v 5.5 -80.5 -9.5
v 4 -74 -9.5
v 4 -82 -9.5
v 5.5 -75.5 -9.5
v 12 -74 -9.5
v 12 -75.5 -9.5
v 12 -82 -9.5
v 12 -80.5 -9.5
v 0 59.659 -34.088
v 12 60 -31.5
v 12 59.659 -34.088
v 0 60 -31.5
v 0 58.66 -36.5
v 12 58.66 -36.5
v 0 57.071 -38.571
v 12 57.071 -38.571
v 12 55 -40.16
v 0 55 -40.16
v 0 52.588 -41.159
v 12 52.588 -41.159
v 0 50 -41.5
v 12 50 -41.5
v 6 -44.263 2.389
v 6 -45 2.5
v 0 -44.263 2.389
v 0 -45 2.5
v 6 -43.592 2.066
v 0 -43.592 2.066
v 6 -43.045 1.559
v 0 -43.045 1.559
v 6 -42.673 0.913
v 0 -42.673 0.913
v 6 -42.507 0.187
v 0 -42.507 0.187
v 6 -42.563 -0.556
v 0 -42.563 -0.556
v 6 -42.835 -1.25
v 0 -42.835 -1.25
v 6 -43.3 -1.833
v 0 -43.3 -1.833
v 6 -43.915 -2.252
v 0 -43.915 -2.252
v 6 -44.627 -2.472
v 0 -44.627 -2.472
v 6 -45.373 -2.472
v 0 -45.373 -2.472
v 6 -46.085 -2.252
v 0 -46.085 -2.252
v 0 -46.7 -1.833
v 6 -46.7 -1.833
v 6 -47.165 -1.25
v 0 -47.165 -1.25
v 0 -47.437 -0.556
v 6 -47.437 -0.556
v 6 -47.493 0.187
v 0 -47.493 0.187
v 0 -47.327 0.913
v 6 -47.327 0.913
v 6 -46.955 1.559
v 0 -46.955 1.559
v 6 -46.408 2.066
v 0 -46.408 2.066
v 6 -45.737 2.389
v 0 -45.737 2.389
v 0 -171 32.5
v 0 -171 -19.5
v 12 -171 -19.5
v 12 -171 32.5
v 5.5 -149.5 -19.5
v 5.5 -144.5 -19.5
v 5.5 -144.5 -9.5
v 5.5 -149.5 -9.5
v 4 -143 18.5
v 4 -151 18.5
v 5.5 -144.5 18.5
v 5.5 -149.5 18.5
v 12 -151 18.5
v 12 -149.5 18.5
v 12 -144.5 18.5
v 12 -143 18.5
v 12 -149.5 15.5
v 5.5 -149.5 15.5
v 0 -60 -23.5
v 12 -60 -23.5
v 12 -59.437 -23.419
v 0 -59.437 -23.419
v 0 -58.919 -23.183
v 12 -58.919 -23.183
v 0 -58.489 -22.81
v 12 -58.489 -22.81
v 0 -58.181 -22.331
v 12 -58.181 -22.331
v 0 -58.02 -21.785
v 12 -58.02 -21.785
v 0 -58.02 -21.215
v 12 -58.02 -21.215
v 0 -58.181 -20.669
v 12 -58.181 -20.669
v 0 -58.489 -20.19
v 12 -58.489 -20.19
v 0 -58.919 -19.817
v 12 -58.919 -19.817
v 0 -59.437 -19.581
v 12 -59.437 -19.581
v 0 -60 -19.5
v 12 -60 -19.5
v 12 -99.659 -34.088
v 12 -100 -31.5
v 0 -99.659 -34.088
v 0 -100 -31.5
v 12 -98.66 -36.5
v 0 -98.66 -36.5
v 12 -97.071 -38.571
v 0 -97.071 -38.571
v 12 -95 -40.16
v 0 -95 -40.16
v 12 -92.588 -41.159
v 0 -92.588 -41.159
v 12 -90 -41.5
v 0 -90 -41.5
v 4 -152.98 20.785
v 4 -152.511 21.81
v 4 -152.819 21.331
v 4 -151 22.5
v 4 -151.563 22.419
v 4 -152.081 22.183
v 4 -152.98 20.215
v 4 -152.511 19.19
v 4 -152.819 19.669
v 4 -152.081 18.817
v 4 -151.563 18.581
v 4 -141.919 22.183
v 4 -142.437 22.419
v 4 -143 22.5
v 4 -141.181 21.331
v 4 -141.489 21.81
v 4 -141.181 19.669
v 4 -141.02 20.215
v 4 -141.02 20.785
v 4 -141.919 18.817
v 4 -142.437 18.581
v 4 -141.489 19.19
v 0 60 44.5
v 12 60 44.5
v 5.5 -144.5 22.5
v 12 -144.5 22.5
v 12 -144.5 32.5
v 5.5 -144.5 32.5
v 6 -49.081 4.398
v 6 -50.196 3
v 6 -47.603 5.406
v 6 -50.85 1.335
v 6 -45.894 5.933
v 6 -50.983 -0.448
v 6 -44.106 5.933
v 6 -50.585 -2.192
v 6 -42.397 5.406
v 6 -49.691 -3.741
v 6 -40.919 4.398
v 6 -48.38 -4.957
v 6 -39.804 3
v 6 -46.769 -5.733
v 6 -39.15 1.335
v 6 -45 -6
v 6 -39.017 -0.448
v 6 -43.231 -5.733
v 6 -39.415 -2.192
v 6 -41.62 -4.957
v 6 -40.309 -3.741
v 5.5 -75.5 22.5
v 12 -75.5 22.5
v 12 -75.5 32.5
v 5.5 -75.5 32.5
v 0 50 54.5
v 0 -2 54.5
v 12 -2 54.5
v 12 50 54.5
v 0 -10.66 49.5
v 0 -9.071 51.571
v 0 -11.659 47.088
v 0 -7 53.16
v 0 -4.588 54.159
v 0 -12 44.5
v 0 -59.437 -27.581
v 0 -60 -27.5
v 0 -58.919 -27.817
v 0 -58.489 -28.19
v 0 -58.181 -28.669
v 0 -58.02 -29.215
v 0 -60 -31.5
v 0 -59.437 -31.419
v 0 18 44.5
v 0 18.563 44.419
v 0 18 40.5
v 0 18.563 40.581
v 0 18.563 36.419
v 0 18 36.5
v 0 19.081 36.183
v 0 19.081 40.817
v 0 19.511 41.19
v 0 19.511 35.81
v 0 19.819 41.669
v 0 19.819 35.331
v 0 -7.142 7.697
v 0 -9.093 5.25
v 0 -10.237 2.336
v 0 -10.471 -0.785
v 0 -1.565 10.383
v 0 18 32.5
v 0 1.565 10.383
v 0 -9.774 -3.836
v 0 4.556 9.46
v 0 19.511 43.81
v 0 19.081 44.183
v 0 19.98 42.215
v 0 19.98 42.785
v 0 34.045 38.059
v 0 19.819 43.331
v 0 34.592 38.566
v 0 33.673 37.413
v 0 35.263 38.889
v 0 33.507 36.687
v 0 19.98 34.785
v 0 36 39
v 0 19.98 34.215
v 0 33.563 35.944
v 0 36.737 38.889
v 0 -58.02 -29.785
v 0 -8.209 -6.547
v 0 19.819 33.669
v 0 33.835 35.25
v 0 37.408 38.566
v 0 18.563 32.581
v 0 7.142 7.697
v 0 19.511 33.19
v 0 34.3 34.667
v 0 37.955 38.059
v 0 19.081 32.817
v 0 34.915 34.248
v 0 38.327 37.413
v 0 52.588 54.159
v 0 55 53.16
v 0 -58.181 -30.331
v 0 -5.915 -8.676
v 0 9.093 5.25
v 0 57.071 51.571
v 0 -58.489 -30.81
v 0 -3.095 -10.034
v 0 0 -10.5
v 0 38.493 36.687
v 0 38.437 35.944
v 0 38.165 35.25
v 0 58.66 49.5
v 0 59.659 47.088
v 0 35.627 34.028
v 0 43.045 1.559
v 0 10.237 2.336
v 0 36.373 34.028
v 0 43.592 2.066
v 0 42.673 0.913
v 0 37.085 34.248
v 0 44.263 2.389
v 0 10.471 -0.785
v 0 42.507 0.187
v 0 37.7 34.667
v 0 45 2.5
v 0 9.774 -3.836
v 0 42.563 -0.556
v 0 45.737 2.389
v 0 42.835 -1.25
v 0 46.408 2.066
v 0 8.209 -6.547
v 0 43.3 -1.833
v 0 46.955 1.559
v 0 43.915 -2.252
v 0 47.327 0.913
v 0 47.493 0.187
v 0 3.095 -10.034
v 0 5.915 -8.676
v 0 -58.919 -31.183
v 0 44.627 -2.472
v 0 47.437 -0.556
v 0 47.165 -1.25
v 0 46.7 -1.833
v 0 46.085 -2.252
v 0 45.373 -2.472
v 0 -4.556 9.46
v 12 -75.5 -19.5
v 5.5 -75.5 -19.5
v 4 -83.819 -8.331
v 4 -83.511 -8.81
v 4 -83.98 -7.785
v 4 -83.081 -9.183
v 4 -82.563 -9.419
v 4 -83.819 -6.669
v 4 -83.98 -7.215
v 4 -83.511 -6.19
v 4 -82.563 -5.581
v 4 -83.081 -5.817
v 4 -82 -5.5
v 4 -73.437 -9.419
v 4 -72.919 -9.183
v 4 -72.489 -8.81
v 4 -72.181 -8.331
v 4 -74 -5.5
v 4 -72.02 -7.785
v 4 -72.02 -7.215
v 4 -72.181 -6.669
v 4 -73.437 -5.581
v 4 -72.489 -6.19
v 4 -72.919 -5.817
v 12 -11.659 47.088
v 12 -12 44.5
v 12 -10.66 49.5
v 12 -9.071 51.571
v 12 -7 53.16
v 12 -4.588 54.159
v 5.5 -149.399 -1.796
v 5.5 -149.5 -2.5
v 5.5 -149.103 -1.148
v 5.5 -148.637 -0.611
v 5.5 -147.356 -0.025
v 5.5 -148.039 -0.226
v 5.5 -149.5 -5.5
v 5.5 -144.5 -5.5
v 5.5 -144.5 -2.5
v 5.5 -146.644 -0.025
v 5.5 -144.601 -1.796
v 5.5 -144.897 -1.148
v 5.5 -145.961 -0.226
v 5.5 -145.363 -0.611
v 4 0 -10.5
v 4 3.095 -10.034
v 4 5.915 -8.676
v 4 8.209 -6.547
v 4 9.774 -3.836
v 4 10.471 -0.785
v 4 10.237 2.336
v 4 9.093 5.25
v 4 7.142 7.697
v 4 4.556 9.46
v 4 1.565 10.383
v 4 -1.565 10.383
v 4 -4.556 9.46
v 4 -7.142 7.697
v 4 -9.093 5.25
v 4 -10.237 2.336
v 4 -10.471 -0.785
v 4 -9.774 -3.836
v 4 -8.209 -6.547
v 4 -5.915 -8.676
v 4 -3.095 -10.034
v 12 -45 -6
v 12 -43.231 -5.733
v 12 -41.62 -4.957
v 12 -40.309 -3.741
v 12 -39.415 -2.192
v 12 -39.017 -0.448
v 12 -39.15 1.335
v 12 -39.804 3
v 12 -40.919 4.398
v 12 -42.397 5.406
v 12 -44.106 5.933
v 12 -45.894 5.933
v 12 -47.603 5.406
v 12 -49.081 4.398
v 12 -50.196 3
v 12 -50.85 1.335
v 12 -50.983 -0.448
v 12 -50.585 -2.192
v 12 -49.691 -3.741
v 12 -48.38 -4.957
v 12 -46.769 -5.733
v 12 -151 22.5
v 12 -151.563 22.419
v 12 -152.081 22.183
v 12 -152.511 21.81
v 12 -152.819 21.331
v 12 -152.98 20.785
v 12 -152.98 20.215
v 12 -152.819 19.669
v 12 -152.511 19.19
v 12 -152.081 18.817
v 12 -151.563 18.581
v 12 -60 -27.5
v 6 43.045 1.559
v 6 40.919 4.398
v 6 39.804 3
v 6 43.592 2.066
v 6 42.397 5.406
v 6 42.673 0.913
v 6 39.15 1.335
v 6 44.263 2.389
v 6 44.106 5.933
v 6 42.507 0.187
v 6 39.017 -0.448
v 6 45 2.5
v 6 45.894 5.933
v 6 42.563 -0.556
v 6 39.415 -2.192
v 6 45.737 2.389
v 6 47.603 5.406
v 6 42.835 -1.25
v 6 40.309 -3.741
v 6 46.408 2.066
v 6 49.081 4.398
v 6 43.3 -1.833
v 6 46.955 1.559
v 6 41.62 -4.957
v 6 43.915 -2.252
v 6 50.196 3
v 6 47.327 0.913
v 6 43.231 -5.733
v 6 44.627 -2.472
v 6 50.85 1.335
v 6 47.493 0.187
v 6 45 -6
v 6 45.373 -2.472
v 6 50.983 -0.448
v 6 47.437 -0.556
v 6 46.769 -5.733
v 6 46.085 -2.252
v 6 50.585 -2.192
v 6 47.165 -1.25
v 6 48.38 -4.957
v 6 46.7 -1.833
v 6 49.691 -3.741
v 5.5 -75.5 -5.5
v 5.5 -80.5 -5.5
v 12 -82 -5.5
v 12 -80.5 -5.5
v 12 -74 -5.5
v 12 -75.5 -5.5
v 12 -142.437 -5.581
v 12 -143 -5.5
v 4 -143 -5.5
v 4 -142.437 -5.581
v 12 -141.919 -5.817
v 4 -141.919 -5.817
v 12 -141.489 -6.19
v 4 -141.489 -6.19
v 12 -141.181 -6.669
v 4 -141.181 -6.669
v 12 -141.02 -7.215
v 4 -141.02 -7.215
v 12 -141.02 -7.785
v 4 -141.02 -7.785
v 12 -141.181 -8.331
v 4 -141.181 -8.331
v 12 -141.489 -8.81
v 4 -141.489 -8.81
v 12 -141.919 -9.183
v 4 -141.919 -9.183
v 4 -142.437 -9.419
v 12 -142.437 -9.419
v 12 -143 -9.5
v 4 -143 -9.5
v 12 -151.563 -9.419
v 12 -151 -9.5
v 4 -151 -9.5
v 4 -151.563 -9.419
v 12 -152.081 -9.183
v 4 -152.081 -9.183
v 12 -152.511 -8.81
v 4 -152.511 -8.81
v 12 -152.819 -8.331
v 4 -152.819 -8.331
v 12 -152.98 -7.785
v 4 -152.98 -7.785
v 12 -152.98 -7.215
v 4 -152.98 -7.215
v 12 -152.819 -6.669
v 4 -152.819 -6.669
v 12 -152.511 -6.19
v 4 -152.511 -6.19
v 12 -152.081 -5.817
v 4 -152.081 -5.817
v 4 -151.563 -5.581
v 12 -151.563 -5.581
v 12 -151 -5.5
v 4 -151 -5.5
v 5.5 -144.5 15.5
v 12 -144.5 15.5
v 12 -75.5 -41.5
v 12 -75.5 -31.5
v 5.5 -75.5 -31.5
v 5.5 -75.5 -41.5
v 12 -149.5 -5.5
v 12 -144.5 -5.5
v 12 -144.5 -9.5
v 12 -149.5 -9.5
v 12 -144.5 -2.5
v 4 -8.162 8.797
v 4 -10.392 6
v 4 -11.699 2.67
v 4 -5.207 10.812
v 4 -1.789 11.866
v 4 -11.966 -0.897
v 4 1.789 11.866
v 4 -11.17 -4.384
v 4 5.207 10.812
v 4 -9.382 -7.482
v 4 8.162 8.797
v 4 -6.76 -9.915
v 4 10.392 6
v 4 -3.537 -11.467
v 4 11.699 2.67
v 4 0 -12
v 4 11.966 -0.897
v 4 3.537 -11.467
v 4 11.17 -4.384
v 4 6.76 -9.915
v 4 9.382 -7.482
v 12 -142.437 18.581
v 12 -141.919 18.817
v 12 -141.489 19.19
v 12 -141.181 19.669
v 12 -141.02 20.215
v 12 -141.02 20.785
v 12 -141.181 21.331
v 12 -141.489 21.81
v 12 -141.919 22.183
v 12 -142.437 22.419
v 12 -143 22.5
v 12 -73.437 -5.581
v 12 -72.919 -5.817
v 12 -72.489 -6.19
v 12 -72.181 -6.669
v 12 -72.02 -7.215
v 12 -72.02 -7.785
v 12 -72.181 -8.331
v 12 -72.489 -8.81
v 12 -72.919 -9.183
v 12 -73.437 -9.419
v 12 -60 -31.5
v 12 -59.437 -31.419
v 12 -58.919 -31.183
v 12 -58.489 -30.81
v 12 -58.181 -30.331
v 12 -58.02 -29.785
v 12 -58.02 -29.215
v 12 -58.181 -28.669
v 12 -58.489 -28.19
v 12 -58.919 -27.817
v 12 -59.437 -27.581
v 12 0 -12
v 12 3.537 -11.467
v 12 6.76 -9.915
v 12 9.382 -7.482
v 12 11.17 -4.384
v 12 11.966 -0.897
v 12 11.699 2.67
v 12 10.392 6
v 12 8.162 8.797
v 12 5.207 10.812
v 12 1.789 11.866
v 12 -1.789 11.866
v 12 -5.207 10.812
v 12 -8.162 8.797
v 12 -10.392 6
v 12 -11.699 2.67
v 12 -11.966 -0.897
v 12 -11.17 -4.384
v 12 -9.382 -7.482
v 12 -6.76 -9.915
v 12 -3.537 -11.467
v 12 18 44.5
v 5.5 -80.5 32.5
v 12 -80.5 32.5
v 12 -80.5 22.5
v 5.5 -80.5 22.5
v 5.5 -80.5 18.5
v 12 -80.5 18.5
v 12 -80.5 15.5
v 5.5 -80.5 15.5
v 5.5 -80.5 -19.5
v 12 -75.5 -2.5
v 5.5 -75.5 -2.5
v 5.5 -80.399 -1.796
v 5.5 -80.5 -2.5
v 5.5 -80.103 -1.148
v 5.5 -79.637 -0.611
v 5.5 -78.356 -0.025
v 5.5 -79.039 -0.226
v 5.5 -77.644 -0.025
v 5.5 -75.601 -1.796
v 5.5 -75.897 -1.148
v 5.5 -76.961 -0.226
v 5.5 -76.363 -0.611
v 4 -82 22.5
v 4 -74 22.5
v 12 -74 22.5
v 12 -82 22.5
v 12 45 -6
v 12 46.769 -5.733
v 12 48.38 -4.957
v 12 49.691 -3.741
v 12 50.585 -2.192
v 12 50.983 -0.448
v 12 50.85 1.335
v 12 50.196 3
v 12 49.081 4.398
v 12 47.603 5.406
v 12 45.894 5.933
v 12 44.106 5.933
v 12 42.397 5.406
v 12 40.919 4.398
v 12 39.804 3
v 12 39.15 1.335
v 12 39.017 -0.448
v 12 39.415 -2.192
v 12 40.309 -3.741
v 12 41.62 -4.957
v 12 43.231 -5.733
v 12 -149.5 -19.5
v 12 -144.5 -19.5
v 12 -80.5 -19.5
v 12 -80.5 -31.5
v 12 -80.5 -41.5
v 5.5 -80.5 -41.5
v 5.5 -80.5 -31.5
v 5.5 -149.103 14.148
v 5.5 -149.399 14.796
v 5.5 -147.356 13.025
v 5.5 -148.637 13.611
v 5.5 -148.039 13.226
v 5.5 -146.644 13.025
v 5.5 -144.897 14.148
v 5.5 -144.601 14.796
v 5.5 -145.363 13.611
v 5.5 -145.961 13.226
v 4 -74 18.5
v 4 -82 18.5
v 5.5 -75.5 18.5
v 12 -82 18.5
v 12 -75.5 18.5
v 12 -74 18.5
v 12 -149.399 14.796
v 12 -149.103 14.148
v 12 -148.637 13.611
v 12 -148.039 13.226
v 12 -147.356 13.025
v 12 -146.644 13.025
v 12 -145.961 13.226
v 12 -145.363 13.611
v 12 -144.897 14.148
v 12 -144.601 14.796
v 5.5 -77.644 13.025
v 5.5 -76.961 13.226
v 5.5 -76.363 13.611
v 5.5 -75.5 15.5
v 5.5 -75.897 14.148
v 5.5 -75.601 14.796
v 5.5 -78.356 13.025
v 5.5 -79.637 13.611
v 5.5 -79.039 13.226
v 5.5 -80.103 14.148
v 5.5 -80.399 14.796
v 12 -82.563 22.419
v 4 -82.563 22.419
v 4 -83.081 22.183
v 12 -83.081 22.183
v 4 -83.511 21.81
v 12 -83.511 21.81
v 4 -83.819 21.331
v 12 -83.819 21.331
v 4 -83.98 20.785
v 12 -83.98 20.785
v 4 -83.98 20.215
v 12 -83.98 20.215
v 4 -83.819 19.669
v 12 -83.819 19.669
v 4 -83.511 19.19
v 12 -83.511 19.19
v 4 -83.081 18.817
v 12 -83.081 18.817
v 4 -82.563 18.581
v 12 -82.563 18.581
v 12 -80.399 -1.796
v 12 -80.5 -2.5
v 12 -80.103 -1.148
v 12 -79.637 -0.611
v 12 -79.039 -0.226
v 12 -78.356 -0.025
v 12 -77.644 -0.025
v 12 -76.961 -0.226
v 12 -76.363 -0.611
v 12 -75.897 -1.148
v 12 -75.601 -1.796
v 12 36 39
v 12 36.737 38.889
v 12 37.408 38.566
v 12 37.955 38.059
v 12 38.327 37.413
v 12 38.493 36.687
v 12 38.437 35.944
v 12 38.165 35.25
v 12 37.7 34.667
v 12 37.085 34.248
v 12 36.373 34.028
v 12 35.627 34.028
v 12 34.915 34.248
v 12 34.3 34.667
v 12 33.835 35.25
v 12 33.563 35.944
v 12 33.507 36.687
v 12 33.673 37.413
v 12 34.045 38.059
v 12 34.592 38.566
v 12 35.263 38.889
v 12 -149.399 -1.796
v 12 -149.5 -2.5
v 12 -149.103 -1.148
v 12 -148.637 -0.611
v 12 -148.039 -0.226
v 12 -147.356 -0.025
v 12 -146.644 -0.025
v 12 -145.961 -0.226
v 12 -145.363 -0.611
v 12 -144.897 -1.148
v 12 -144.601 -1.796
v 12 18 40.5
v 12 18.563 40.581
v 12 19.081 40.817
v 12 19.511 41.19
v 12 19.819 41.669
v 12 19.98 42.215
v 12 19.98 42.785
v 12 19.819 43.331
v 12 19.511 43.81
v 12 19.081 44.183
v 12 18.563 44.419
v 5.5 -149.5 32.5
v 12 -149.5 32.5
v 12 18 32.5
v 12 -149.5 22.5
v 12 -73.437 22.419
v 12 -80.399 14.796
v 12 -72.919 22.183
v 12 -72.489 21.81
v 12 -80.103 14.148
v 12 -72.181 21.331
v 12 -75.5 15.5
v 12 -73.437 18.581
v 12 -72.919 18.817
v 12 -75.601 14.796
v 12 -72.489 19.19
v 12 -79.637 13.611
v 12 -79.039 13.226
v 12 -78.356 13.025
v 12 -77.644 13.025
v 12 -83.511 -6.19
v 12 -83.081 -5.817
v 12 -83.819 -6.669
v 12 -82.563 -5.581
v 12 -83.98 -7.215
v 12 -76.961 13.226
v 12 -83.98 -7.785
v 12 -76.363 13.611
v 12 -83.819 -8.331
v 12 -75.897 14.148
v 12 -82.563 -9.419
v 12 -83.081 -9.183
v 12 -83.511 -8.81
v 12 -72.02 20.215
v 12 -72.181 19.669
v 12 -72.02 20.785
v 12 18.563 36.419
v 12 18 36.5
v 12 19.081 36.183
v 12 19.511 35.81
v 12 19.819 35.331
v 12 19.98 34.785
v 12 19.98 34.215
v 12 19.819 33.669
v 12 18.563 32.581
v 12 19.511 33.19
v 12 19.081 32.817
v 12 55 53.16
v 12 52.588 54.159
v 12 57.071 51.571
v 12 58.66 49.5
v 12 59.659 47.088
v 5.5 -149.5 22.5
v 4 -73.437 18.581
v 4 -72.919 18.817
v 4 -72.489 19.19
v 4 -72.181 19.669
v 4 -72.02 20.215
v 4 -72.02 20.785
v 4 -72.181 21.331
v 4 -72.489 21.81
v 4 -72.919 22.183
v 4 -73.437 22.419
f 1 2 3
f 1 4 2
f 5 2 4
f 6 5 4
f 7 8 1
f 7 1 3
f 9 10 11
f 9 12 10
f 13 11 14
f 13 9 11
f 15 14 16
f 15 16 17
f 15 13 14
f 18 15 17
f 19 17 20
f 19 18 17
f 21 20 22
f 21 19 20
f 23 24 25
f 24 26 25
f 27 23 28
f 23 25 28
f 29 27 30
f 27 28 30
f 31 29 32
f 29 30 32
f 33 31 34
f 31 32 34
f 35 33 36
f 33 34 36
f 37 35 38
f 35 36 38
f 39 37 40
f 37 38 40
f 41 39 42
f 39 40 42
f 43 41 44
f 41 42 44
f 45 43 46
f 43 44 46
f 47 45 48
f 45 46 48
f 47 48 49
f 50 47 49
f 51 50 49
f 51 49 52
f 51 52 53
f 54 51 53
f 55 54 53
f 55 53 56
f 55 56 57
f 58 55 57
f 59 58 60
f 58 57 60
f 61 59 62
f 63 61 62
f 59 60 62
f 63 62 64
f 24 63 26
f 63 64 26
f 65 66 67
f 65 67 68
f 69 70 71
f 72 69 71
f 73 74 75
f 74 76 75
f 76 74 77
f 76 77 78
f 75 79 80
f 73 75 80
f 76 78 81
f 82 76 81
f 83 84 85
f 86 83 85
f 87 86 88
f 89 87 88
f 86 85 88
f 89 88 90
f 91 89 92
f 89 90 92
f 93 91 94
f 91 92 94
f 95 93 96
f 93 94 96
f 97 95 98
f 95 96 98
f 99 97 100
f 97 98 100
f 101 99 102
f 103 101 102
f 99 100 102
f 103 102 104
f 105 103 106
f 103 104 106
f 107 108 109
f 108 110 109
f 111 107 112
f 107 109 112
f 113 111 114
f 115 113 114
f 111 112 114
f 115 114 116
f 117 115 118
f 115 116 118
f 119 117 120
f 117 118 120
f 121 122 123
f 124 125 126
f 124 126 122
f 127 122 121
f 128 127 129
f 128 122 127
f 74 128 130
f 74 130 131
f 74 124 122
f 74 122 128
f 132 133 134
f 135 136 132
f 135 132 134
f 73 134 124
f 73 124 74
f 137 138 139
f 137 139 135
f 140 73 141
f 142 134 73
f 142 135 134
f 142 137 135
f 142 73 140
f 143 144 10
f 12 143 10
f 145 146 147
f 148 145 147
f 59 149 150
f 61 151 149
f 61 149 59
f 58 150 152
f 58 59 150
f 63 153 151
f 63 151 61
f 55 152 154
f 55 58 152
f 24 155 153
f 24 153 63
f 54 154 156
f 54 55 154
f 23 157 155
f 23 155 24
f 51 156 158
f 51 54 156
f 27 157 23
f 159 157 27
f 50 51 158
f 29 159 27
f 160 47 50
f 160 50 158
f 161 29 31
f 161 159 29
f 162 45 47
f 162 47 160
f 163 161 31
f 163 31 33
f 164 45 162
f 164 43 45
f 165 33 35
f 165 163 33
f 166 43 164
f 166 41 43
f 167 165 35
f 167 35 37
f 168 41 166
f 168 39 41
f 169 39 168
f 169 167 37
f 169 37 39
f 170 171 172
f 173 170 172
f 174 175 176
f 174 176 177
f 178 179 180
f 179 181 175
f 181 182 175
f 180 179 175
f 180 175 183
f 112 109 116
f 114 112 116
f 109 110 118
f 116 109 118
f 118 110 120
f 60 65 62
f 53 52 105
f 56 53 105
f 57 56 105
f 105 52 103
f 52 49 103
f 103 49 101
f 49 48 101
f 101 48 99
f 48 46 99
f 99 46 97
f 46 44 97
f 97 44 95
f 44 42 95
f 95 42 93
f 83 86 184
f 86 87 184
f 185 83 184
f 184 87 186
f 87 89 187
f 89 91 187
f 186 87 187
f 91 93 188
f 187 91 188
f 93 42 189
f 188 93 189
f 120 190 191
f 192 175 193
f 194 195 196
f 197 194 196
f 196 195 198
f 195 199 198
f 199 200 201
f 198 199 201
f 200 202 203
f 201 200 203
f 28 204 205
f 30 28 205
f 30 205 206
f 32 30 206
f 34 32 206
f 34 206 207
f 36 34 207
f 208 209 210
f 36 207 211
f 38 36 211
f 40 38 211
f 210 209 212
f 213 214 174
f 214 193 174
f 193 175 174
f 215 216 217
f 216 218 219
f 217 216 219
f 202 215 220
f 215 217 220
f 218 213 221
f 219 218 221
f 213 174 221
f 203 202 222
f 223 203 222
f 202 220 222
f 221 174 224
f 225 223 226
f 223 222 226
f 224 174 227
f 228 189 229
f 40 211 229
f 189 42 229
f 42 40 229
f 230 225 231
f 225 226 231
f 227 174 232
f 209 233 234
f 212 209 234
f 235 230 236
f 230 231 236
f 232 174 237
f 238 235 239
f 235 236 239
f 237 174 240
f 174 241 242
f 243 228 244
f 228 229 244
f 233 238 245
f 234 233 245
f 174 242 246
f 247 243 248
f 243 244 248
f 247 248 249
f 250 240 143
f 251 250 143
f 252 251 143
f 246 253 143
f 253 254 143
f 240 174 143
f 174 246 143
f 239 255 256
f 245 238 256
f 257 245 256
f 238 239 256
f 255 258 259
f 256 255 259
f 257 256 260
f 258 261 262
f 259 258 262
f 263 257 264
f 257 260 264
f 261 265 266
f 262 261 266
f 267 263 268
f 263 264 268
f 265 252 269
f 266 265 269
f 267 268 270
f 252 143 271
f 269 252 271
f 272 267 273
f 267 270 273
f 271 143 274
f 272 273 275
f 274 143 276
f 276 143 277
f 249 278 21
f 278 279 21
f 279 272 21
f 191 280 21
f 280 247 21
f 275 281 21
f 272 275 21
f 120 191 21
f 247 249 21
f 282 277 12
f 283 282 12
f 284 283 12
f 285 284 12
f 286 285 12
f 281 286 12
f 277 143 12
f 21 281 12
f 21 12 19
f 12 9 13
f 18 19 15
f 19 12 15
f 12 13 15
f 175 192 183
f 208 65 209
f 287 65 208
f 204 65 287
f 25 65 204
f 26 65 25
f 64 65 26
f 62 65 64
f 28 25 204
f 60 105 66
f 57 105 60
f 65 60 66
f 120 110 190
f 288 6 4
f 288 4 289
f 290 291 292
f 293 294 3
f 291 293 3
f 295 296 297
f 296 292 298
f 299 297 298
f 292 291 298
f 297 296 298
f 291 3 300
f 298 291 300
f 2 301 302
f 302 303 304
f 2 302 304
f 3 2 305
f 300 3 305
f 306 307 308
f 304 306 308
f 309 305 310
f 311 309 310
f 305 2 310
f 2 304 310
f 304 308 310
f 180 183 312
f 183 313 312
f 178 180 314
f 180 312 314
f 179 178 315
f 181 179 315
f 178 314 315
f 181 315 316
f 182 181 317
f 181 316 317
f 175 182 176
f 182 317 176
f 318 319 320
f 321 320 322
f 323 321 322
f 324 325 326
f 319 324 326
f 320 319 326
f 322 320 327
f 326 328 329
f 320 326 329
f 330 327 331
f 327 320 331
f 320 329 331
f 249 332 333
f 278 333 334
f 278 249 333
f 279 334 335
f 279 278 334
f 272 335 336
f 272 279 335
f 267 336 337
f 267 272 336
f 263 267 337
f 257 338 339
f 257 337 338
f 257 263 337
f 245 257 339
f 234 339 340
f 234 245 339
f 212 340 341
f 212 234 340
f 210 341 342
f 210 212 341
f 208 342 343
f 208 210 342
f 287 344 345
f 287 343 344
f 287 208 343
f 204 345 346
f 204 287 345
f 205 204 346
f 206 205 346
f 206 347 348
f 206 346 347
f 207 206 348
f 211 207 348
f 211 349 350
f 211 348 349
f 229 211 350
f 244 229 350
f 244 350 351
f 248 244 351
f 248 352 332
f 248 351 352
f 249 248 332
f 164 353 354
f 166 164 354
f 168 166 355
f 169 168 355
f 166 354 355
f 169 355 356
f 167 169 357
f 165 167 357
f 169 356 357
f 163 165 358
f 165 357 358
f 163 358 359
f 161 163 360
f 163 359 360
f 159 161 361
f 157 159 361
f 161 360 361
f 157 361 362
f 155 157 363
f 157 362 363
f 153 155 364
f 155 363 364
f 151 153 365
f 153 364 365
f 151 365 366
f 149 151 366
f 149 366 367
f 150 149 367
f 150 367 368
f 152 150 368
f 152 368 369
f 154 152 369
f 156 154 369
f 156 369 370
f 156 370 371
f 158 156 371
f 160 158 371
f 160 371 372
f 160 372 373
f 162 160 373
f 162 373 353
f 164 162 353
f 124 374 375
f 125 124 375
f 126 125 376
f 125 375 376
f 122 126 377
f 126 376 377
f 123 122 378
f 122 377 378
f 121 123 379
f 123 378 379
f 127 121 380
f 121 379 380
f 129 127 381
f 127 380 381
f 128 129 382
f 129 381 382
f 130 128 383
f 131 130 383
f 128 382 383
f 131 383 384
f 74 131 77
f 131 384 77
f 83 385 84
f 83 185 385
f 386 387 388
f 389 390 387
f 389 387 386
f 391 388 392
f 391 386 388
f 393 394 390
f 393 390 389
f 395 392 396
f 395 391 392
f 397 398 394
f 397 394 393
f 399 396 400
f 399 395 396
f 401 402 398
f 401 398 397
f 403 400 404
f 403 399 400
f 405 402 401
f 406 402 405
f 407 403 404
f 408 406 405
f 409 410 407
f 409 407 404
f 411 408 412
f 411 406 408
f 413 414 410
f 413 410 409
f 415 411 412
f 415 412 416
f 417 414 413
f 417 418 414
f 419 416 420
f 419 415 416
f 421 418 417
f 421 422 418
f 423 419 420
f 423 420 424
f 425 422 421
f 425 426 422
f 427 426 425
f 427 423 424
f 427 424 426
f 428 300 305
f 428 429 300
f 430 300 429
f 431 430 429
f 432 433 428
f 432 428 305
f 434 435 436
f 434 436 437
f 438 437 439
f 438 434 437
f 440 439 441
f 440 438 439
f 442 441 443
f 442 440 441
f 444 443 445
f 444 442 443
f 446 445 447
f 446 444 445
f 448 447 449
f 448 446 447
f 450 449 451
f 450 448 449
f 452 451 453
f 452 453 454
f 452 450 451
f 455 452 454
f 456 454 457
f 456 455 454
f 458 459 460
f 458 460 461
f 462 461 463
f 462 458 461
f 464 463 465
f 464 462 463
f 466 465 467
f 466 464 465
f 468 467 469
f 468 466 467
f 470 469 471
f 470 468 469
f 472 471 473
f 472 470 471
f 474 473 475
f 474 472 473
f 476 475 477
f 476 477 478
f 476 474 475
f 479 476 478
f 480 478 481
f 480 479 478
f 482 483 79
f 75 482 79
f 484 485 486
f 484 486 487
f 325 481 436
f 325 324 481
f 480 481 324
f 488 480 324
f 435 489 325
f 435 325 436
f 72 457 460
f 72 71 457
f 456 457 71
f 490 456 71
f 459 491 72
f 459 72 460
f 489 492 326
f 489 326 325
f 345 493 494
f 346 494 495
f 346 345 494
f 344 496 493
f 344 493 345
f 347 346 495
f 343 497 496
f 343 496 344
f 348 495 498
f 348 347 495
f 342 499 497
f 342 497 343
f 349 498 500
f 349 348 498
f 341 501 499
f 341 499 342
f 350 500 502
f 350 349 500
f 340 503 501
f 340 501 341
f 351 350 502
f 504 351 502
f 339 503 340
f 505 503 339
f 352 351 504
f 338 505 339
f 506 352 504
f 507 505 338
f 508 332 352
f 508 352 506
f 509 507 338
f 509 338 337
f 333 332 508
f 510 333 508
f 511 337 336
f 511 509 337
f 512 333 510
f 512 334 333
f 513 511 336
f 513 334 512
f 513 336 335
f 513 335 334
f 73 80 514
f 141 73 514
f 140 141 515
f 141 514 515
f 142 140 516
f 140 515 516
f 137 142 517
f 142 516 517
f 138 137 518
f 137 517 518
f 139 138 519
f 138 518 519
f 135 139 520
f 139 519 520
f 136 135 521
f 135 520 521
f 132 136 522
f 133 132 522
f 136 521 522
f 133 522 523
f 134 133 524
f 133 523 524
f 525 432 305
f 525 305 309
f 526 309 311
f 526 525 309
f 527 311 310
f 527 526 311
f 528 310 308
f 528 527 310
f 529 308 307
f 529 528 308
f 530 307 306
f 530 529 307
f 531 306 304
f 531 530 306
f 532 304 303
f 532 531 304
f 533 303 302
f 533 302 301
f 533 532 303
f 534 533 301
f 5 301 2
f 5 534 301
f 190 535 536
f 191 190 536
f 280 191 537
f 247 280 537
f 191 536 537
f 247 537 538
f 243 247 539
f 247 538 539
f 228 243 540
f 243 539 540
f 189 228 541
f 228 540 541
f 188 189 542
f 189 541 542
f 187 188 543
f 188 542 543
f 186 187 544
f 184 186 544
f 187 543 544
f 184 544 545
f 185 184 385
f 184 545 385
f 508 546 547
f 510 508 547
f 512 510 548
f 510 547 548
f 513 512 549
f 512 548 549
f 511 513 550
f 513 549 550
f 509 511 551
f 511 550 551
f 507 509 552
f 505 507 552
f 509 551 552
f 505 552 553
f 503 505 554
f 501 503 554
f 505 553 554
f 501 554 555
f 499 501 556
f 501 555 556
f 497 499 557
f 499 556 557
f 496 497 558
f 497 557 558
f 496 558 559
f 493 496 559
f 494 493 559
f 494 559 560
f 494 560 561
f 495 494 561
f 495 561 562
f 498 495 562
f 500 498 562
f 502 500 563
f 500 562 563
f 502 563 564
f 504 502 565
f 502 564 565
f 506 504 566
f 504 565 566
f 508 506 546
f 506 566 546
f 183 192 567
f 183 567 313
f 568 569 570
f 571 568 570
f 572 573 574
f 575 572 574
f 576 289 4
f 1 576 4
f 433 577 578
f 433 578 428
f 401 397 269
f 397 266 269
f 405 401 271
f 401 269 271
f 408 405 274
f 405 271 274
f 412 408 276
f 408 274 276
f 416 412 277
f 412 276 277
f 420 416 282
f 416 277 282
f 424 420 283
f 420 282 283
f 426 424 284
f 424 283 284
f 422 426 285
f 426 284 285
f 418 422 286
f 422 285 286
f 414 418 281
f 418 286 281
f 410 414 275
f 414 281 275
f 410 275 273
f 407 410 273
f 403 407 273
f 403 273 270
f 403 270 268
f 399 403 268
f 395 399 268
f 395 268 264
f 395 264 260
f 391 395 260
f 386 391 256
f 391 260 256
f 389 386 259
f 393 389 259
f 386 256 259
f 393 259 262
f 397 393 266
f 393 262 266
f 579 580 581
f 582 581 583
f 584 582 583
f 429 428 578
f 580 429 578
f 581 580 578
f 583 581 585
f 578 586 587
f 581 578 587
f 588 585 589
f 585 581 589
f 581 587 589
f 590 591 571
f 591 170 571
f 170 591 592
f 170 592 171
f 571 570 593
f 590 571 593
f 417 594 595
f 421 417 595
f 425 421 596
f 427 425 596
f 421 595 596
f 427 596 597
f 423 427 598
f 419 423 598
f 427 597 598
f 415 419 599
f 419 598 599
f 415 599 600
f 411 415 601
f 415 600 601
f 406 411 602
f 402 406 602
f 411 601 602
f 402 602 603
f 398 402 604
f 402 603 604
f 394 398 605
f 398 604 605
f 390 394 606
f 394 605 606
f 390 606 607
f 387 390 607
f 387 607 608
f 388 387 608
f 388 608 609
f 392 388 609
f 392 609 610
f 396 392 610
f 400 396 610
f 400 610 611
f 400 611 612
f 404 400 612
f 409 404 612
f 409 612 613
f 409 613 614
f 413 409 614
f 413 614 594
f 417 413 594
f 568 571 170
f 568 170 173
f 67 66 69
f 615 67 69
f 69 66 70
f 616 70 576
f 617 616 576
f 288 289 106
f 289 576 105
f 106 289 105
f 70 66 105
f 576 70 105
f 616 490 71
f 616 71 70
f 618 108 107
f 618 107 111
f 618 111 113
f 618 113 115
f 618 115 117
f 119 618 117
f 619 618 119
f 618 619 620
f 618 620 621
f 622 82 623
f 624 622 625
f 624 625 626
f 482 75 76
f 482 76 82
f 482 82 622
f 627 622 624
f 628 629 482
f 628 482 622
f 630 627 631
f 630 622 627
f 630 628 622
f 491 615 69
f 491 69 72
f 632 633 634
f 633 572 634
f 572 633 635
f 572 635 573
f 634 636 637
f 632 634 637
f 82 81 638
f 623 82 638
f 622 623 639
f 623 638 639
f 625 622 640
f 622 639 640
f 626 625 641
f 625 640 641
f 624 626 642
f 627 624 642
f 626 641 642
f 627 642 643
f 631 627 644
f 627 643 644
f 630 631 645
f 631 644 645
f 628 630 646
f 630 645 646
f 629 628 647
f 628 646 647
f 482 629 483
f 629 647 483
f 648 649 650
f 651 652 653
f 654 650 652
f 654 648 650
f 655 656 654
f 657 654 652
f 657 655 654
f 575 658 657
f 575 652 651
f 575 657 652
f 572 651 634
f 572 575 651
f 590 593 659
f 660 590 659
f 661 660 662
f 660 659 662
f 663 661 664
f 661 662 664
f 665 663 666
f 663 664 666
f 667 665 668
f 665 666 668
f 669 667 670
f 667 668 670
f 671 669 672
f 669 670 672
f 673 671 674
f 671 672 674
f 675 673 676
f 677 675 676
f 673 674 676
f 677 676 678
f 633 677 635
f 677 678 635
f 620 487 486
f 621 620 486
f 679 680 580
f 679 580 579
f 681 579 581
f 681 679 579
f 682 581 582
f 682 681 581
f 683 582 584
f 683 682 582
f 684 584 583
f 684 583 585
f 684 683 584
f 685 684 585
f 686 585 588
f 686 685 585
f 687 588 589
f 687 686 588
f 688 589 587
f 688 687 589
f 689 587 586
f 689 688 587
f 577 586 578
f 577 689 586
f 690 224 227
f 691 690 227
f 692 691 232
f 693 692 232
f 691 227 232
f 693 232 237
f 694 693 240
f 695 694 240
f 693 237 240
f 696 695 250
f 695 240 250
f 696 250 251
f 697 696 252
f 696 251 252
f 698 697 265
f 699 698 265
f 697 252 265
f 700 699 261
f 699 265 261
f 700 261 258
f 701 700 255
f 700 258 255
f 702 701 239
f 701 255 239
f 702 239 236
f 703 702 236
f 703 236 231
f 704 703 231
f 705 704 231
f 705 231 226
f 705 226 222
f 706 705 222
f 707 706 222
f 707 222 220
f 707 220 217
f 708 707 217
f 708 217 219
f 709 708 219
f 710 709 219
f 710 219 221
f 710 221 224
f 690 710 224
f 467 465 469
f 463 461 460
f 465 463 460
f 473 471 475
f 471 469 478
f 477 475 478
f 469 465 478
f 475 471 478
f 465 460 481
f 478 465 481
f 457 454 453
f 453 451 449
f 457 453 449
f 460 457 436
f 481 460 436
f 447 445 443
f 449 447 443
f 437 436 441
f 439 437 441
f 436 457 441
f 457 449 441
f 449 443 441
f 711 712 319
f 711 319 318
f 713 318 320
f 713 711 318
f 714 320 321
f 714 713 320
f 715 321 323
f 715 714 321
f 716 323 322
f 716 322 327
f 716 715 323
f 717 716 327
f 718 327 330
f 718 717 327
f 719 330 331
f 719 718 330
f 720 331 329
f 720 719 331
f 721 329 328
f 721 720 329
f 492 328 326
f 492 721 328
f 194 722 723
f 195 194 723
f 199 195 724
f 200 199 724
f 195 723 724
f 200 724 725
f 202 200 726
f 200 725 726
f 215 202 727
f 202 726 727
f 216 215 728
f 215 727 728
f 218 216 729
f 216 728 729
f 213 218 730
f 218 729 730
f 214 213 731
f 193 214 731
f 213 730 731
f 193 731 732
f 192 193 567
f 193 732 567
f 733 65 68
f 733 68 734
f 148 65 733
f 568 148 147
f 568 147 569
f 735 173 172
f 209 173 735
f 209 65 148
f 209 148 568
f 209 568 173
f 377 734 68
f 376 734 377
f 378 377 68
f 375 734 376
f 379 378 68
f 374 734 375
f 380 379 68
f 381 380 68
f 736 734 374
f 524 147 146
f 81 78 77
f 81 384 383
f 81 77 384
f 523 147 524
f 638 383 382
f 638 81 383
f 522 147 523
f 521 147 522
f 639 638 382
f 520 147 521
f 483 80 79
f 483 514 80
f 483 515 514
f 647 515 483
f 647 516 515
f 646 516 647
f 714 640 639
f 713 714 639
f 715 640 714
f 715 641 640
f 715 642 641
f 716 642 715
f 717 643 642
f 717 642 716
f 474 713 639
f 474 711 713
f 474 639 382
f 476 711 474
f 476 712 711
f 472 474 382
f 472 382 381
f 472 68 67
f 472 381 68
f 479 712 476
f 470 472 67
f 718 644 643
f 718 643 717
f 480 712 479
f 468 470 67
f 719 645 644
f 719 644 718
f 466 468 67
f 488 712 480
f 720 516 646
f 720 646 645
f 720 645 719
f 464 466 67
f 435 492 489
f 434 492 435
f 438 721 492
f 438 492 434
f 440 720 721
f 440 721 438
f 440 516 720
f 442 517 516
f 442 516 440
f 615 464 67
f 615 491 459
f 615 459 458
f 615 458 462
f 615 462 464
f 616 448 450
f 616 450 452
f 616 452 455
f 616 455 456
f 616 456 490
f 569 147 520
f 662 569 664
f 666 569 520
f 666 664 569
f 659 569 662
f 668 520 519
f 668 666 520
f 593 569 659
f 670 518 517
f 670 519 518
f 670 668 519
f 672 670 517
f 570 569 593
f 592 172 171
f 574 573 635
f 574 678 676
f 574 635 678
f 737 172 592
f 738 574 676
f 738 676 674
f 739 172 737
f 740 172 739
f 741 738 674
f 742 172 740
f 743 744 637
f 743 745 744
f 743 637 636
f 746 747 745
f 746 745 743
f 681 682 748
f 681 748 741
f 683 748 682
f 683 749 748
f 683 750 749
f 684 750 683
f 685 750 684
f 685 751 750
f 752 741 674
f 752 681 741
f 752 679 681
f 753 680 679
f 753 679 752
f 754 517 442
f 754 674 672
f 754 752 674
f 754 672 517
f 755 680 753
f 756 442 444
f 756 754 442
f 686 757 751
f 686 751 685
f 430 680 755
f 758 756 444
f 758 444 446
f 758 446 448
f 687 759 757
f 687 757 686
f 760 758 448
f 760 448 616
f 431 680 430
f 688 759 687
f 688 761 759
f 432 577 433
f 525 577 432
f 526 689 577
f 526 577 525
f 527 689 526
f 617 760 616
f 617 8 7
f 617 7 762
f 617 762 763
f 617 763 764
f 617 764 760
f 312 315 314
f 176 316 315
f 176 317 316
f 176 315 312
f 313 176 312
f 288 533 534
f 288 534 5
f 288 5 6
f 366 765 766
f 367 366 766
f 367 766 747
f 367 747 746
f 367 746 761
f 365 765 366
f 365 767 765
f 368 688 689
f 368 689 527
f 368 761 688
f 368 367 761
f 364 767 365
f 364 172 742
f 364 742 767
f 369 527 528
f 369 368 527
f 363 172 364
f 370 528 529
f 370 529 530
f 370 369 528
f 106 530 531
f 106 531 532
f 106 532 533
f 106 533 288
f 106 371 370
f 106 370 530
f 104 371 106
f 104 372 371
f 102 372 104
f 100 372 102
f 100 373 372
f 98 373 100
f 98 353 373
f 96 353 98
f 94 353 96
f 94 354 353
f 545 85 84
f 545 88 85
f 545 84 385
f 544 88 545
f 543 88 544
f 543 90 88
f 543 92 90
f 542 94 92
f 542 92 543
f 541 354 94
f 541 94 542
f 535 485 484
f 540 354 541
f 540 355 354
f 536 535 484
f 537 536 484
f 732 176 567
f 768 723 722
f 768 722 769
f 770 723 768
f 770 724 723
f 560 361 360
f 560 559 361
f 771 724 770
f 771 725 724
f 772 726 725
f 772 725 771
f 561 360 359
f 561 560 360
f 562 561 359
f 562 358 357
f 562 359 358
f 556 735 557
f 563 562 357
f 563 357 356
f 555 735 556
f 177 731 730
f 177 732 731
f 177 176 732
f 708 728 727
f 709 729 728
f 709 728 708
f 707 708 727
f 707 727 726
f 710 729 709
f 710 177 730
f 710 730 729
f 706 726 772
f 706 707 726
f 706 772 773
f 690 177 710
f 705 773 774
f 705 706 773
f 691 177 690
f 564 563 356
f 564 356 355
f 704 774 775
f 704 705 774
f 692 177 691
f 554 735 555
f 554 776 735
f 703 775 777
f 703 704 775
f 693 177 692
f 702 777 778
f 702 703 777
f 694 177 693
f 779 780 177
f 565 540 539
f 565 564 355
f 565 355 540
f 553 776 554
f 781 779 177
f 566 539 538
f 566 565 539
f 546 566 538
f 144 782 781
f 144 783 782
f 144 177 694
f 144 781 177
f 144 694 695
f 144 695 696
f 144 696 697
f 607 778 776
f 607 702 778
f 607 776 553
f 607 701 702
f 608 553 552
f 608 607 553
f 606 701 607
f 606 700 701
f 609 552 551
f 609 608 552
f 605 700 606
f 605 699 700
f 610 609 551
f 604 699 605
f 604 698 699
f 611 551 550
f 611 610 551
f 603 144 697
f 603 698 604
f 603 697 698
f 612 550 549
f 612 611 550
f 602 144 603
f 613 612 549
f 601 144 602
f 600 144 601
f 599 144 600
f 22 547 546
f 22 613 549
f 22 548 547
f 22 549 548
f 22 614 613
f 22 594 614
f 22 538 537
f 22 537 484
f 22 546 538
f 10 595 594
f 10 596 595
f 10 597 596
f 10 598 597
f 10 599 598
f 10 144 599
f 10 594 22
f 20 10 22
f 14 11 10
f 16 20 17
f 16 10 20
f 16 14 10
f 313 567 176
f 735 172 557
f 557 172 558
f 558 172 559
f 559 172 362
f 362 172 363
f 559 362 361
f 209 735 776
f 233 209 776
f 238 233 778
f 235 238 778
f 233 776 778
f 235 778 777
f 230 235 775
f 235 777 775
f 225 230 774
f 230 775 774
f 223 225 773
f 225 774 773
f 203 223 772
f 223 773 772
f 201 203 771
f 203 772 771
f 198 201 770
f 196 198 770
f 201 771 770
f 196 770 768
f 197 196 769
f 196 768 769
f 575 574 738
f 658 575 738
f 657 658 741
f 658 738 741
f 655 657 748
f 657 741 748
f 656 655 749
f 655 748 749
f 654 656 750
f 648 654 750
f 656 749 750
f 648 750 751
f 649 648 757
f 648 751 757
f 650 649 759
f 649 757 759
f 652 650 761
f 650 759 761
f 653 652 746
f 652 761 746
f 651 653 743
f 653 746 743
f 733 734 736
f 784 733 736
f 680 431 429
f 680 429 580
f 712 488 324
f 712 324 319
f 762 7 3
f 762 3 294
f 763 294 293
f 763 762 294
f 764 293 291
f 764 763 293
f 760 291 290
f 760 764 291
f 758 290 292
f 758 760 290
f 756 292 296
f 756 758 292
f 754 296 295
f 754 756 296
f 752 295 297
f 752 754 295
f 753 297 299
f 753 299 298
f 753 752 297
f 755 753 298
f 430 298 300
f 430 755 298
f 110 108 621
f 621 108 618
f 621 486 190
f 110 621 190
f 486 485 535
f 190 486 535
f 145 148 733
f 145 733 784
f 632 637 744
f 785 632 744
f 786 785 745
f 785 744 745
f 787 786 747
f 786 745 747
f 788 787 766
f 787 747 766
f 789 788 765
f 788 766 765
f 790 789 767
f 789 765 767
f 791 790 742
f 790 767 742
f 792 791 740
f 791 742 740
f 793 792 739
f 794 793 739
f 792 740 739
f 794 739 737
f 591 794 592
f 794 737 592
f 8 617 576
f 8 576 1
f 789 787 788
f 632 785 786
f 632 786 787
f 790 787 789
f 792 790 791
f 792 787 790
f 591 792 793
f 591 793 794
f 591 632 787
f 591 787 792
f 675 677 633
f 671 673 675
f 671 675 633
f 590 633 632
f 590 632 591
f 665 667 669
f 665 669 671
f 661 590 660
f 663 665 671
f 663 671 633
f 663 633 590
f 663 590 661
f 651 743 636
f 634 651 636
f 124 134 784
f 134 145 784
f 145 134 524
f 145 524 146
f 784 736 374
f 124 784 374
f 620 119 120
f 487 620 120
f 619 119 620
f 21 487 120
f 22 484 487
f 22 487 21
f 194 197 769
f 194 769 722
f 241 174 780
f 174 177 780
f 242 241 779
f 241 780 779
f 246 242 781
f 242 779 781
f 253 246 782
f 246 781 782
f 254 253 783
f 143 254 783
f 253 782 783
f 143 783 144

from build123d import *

# Parameters (mm, degrees)
SKETCH1_W                          = 63
SKETCH1_H                          = 120
SKETCH1_R                          = 10.5
BOSS_EXTRUDE1_DEPTH                = 12
BOSS_EXTRUDE2_DEPTH                = 12
SKETCH9_W                          = 52
SKETCH9_H                          = 111
BOSS_EXTRUDE3_DEPTH                = 12
SKETCH11_W                         = 10
SKETCH11_H                         = 160
BOSS_EXTRUDE4_DEPTH                = 12
F_5_0_5_DIAMETER_HOLE1_D           = 5
LINEAR_RAIL_MOUNT_HOLE_D           = 5
LINEAR_RAIL_MOUNT_HOLE_CBORE_D     = 12
LINEAR_RAIL_MOUNT_HOLE_CBORE_DEPTH = 6
SKETCH27_R                         = 12
CUT_EXTRUDE1_DEPTH                 = 8
CUT_EXTRUDE2_REACH                 = 181.876
FILLET1_R                          = 10
CUT_EXTRUDE3_DEPTH                 = 8
CUT_EXTRUDE4_DEPTH                 = 6.5
LPATTERN1_COUNT                    = 2
LPATTERN1_PITCH                    = 69
MIRROR1_COPY_1_DEPTH               = 8
MIRROR1_COPY_2_DEPTH               = 6.5


with BuildPart() as part:
    # Sketch1 → Boss-Extrude1 (new body)
    with BuildSketch(Plane(origin=(0, 0, 0), x_dir=(0, 0, -1), z_dir=(1, 0, 0))):
        Rectangle(SKETCH1_W, SKETCH1_H)
        Circle(SKETCH1_R, mode=Mode.SUBTRACT)
    extrude(amount=BOSS_EXTRUDE1_DEPTH)

    # Sketch8 → Boss-Extrude2 (add)
    with BuildSketch(Plane.ZY):
        Polygon((44.5, 18), (44.5, -12), (54.5, -12), (54.5, 60), (31.5, 60), (31.5, -60), (32.5, -60), (32.5, 18), align=None)
    extrude(amount=-BOSS_EXTRUDE2_DEPTH)

    # Sketch9 → Boss-Extrude3 (add)
    with BuildSketch(Plane.ZY):
        with Locations((6.5, -115.5)):
            Rectangle(SKETCH9_W, SKETCH9_H)
    extrude(amount=-BOSS_EXTRUDE3_DEPTH)

    # Sketch11 → Boss-Extrude4 (add)
    with BuildSketch(Plane(origin=(12, 0, 0), x_dir=(0, 0, -1), z_dir=(1, 0, 0))):
        with Locations((36.5, -20)):
            Rectangle(SKETCH11_W, SKETCH11_H)
    extrude(amount=-BOSS_EXTRUDE4_DEPTH)

    # Ø5.0 (5) Diameter Hole1 (through all)
    with Locations(Plane(origin=(12, 0, 0), x_dir=(0, 0, -1), z_dir=(1, 0, 0))):
        with Locations((-36.5, 36)):
            Hole(F_5_0_5_DIAMETER_HOLE1_D / 2)

    # Linear Rail Mount Hole (through all)
    with Locations(Plane(origin=(12, 0, 0), x_dir=(0, 0, -1), z_dir=(1, 0, 0))):
        with Locations((0, -45), (0, 45)):
            CounterBoreHole(LINEAR_RAIL_MOUNT_HOLE_D / 2, LINEAR_RAIL_MOUNT_HOLE_CBORE_D / 2, LINEAR_RAIL_MOUNT_HOLE_CBORE_DEPTH)

    # Sketch27 → Cut-Extrude1 (cut)
    with BuildSketch(Plane(origin=(12, 0, 0), x_dir=(0, 0, -1), z_dir=(1, 0, 0))):
        Circle(SKETCH27_R)
    extrude(amount=-CUT_EXTRUDE1_DEPTH, mode=Mode.SUBTRACT)

    # Sketch28 → Cut-Extrude2 (cut, up to next)
    with BuildSketch(Plane(origin=(12, 0, 0), x_dir=(0, 0, -1), z_dir=(1, 0, 0)), mode=Mode.PRIVATE) as cut_extrude2_sk1:
        with BuildLine():
            Line((-44.5, 18), (-40.5, 18))
            ThreePointArc((-40.5, 18), (-42.5, 20), (-44.5, 18))
        make_face()
    cut_extrude2_tool1 = extrude(cut_extrude2_sk1.sketch, amount=-CUT_EXTRUDE2_REACH, mode=Mode.PRIVATE) & part.part
    # Sketch28 → Cut-Extrude2 (cut, up to next)
    with BuildSketch(Plane(origin=(12, 0, 0), x_dir=(0, 0, -1), z_dir=(1, 0, 0)), mode=Mode.PRIVATE) as cut_extrude2_sk2:
        with BuildLine():
            Line((-36.5, 18), (-32.5, 18))
            ThreePointArc((-32.5, 18), (-34.5, 20), (-36.5, 18))
        make_face()
    cut_extrude2_tool2 = extrude(cut_extrude2_sk2.sketch, amount=-CUT_EXTRUDE2_REACH, mode=Mode.PRIVATE) & part.part
    # Sketch28 → Cut-Extrude2 (cut, up to next)
    with BuildSketch(Plane(origin=(12, 0, 0), x_dir=(0, 0, -1), z_dir=(1, 0, 0)), mode=Mode.PRIVATE) as cut_extrude2_sk3:
        with BuildLine():
            Line((19.5, -60), (23.5, -60))
            ThreePointArc((23.5, -60), (21.5, -58), (19.5, -60))
        make_face()
    cut_extrude2_tool3 = extrude(cut_extrude2_sk3.sketch, amount=-CUT_EXTRUDE2_REACH, mode=Mode.PRIVATE) & part.part
    # Sketch28 → Cut-Extrude2 (cut, up to next)
    with BuildSketch(Plane(origin=(12, 0, 0), x_dir=(0, 0, -1), z_dir=(1, 0, 0)), mode=Mode.PRIVATE) as cut_extrude2_sk4:
        with BuildLine():
            Line((27.5, -60), (31.5, -60))
            ThreePointArc((31.5, -60), (29.5, -58), (27.5, -60))
        make_face()
    cut_extrude2_tool4 = extrude(cut_extrude2_sk4.sketch, amount=-CUT_EXTRUDE2_REACH, mode=Mode.PRIVATE) & part.part
    add(cut_extrude2_tool1.solids().sort_by_distance((12, 18.848826, 42.5))[0], mode=Mode.SUBTRACT)
    add(cut_extrude2_tool2.solids().sort_by_distance((12, 18.848826, 34.5))[0], mode=Mode.SUBTRACT)
    add(cut_extrude2_tool3.solids().sort_by_distance((12, -59.151174, -21.5))[0], mode=Mode.SUBTRACT)
    add(cut_extrude2_tool4.solids().sort_by_distance((12, -59.151174, -29.5))[0], mode=Mode.SUBTRACT)

    # Fillet1
    fillet1_edges = [part.edges().sort_by_distance(p)[0] for p in [
        (6, -12, 54.5),
        (6, -100, -41.5),
        (6, 60, 54.5),
        (6, 60, -41.5),
    ]]
    fillet(fillet1_edges, radius=FILLET1_R - 0.0001)  # a hair under: the kernel refuses the full size

    # Sketch29 → Cut-Extrude3 (cut)
    with BuildSketch(Plane(origin=(12, 0, 0), x_dir=(0, 0, -1), z_dir=(1, 0, 0))):
        with BuildLine():
            Line((9.5, -143), (9.5, -151))
            ThreePointArc((9.5, -151), (7.5, -153), (5.5, -151))
            Line((5.5, -151), (5.5, -143))
            ThreePointArc((5.5, -143), (7.5, -141), (9.5, -143))
        make_face()
    cut_extrude3 = extrude(amount=-CUT_EXTRUDE3_DEPTH, mode=Mode.SUBTRACT)

    # Sketch31 → Cut-Extrude4 (cut)
    with BuildSketch(Plane(origin=(12, 0, 0), x_dir=(0, 0, -1), z_dir=(1, 0, 0))):
        with BuildLine():
            Line((65.397486198, -149.5), (2.5, -149.5))
            ThreePointArc((2.5, -149.5), (0, -147), (2.5, -144.5))
            Line((2.5, -144.5), (65.397486198, -144.5))
            ThreePointArc((65.397486198, -144.5), (67.897486198, -147), (65.397486198, -149.5))
        make_face()
    cut_extrude4 = extrude(amount=-CUT_EXTRUDE4_DEPTH, mode=Mode.SUBTRACT)

    # LPattern1: Cut-Extrude3, Cut-Extrude4 ×2
    with Locations(*[(0, i * LPATTERN1_PITCH, 0) for i in range(1, LPATTERN1_COUNT)]):
        add(cut_extrude3, mode=Mode.SUBTRACT)
        add(cut_extrude4, mode=Mode.SUBTRACT)

    # Mirror1: Cut-Extrude3, Cut-Extrude4 across plane
    add(cut_extrude3.mirror(Plane(origin=(0, 0, 6.5), x_dir=(1, 0, 0), z_dir=(0, 0, -1))), mode=Mode.SUBTRACT)
    add(cut_extrude4.mirror(Plane(origin=(0, 0, 6.5), x_dir=(1, 0, 0), z_dir=(0, 0, -1))), mode=Mode.SUBTRACT)

    # Mirror1 copy 1 sketch → Mirror1 copy 1 (cut)
    with BuildSketch(Plane(origin=(12, 69, 13), x_dir=(0, 0, 1), z_dir=(1, 0, 0))):
        with BuildLine():
            Line((9.5, 143), (9.5, 151))
            ThreePointArc((9.5, 151), (7.5, 153), (5.5, 151))
            Line((5.5, 151), (5.5, 143))
            ThreePointArc((5.5, 143), (7.5, 141), (9.5, 143))
        make_face()
    extrude(amount=-MIRROR1_COPY_1_DEPTH, mode=Mode.SUBTRACT)

    # Mirror1 copy 2 sketch → Mirror1 copy 2 (cut)
    with BuildSketch(Plane(origin=(12, 69, 13), x_dir=(0, 0, 1), z_dir=(1, 0, 0))):
        with BuildLine():
            Line((65.397486198, 149.5), (2.5, 149.5))
            ThreePointArc((2.5, 149.5), (0, 147), (2.5, 144.5))
            Line((2.5, 144.5), (65.397486198, 144.5))
            ThreePointArc((65.397486198, 144.5), (67.897486198, 147), (65.397486198, 149.5))
        make_face()
    extrude(amount=-MIRROR1_COPY_2_DEPTH, mode=Mode.SUBTRACT)


solid = part.part
